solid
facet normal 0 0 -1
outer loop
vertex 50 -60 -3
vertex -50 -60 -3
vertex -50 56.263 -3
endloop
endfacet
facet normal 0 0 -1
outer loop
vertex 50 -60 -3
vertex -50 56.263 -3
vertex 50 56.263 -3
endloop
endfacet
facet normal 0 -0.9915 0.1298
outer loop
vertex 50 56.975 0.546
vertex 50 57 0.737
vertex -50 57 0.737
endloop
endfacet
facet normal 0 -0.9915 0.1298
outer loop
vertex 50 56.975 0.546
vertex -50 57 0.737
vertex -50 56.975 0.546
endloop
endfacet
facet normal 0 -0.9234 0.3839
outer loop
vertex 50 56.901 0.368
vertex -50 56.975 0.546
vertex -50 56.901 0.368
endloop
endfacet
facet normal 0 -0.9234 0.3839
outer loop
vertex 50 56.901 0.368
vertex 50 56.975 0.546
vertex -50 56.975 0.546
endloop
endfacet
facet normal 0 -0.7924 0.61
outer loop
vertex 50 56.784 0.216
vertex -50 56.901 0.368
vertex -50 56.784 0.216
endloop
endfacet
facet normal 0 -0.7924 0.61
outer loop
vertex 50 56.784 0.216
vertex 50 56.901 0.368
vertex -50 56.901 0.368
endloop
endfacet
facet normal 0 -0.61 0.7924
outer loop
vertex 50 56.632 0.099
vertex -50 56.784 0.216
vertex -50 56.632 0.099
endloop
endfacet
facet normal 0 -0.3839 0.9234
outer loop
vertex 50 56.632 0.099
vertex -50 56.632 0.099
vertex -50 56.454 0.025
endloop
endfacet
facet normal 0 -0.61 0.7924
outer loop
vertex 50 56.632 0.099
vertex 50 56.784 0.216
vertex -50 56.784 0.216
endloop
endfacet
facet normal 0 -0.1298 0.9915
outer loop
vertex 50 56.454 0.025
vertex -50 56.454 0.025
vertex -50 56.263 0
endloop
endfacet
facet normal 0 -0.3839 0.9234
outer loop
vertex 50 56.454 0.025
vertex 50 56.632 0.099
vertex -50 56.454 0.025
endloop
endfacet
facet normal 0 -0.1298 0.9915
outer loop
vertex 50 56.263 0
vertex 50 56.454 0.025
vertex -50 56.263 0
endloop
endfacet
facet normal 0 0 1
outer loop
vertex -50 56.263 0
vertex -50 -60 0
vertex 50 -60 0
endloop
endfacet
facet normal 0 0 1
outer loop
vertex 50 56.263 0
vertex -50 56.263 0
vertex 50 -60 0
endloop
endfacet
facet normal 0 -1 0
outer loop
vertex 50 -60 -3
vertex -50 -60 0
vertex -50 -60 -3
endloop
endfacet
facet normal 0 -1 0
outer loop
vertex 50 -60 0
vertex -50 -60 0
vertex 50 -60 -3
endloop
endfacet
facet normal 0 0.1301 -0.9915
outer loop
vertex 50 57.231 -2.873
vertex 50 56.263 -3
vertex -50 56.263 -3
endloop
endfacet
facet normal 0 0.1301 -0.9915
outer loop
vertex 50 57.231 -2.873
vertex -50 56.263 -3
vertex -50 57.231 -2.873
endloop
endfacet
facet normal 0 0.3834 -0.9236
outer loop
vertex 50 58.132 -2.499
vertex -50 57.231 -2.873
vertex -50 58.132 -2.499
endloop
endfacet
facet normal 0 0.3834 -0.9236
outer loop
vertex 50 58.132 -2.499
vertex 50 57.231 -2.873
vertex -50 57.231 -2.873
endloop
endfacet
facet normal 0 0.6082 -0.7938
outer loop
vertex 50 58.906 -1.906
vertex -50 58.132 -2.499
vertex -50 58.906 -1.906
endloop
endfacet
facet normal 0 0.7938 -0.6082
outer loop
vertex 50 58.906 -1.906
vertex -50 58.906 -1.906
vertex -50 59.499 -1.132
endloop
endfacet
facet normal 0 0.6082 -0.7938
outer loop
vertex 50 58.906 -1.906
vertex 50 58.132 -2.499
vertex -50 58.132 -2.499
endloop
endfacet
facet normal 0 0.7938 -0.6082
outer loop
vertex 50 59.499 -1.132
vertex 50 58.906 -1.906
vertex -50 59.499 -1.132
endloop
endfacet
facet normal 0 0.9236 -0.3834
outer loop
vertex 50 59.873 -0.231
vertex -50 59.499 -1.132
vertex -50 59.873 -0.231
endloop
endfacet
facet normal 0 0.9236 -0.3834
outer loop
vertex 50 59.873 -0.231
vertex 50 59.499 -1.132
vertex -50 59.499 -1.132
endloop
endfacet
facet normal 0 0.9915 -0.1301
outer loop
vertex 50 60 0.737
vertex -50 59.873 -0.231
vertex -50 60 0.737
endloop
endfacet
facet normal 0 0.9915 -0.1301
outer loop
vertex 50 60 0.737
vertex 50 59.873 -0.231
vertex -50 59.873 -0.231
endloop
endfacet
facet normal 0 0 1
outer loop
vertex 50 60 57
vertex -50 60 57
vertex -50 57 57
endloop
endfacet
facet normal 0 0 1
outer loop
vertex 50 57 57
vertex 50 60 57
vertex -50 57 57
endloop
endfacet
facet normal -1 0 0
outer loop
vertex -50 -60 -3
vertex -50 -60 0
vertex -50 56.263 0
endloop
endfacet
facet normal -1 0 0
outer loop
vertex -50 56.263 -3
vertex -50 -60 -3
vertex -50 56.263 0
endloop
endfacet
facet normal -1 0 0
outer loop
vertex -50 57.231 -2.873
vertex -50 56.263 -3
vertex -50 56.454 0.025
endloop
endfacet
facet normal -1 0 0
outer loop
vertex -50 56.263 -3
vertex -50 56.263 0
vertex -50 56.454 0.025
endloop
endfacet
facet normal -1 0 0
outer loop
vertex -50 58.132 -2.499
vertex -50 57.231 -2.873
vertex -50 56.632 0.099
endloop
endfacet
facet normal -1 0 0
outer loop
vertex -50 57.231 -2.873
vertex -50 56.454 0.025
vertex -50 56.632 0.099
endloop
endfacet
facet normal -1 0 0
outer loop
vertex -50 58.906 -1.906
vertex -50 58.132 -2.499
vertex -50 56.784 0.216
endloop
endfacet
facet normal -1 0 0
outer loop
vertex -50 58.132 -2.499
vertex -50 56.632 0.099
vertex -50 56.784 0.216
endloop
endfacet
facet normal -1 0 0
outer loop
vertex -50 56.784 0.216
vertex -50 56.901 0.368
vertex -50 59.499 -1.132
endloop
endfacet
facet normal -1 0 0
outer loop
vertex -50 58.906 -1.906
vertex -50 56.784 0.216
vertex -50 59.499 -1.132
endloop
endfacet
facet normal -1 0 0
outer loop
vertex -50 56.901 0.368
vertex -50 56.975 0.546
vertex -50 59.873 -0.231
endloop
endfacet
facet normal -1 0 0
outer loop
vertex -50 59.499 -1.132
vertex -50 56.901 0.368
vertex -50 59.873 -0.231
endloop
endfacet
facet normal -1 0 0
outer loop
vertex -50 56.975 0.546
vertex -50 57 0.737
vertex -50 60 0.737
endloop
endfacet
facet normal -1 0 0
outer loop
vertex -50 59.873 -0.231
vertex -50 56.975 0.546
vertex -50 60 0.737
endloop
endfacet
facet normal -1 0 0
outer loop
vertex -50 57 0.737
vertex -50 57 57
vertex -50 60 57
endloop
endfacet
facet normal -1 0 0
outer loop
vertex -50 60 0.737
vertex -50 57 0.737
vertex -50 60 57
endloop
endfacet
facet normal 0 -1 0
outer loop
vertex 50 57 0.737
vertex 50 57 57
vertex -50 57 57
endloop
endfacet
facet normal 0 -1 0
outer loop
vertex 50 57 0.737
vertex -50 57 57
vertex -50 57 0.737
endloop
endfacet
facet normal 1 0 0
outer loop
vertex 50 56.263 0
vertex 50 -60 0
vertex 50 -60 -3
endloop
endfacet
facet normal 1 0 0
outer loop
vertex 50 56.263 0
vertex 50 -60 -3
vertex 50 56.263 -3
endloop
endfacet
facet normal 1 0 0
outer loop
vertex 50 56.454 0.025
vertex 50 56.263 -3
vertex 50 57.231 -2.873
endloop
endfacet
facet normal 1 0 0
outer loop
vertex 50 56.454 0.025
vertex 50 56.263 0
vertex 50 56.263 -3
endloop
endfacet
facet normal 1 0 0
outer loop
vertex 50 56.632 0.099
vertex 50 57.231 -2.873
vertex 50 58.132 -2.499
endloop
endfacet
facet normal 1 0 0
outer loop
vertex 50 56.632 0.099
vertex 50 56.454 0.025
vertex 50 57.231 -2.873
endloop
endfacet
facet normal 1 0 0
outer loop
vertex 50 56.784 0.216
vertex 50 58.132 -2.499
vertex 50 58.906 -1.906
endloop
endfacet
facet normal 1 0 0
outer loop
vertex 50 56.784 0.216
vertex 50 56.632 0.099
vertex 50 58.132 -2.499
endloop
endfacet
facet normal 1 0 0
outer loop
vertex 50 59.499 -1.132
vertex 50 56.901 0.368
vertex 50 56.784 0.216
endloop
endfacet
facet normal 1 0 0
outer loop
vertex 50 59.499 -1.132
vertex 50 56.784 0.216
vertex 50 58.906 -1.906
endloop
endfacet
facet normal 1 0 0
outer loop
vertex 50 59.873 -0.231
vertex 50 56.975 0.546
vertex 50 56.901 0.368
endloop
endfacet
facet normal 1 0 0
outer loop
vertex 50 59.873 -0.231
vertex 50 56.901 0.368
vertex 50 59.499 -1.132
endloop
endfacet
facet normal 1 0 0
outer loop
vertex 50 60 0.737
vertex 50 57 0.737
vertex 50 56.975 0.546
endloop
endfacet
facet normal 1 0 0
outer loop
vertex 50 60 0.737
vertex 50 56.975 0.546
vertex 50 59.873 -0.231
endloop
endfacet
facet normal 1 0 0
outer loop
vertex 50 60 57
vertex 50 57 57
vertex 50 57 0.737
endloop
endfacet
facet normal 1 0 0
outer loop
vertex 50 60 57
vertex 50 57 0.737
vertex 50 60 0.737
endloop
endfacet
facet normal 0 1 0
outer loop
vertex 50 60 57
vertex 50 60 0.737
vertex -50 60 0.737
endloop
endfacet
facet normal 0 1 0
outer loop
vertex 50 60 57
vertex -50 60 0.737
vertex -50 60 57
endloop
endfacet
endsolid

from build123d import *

# Parameters (mm, degrees)
SKETCH_1_W                       = 100
SKETCH_1_H                       = 120
SM_BASE_FLANGE_1_DEPTH           = 3
SM_EDGE_FLANGE_1_STRIP_W         = 13.4732
SM_EDGE_FLANGE_1_STRIP_H         = 3
SM_EDGE_FLANGE_1_STRIP_CUT_DEPTH = 100
SM_EDGE_FLANGE_1_DEPTH           = 100


# Sheet-metal steps are written as plain solids
with BuildPart() as part:
    # Sketch 1 → 基体-法兰1 (new body)
    with BuildSketch(Plane.XY):
        Rectangle(SKETCH_1_W, SKETCH_1_H)
    extrude(amount=-SM_BASE_FLANGE_1_DEPTH)

    # 边线-法兰1 strip (across the edge) → 边线-法兰1 strip cut (cut)
    with BuildSketch(Plane(origin=(50, 60, 0), x_dir=(0, -1, 0), z_dir=(-1, 0, 0))):
        with Locations((-3, -1.5)):
            Rectangle(SM_EDGE_FLANGE_1_STRIP_W, SM_EDGE_FLANGE_1_STRIP_H)
    extrude(amount=SM_EDGE_FLANGE_1_STRIP_CUT_DEPTH, mode=Mode.SUBTRACT)

    # 边线-法兰1 section (across the edge) → 边线-法兰1 (add)
    with BuildSketch(Plane(origin=(50, 60, 0), x_dir=(0, -1, 0), z_dir=(-1, 0, 0))):
        with BuildLine():
            Line((0, 0.7366), (0, 57))
            Line((0, 57), (3, 57))
            Line((3, 57), (3, 0.7366))
            ThreePointArc((3, 0.7366), (3.215745145, 0.215745145), (3.7366, 0))
            Line((3.7366, 0), (3.7366, -3))
            ThreePointArc((3.7366, -3), (1.094424801, -1.905575199), (0, 0.7366))
        make_face()
    extrude(amount=SM_EDGE_FLANGE_1_DEPTH)


solid = part.part
